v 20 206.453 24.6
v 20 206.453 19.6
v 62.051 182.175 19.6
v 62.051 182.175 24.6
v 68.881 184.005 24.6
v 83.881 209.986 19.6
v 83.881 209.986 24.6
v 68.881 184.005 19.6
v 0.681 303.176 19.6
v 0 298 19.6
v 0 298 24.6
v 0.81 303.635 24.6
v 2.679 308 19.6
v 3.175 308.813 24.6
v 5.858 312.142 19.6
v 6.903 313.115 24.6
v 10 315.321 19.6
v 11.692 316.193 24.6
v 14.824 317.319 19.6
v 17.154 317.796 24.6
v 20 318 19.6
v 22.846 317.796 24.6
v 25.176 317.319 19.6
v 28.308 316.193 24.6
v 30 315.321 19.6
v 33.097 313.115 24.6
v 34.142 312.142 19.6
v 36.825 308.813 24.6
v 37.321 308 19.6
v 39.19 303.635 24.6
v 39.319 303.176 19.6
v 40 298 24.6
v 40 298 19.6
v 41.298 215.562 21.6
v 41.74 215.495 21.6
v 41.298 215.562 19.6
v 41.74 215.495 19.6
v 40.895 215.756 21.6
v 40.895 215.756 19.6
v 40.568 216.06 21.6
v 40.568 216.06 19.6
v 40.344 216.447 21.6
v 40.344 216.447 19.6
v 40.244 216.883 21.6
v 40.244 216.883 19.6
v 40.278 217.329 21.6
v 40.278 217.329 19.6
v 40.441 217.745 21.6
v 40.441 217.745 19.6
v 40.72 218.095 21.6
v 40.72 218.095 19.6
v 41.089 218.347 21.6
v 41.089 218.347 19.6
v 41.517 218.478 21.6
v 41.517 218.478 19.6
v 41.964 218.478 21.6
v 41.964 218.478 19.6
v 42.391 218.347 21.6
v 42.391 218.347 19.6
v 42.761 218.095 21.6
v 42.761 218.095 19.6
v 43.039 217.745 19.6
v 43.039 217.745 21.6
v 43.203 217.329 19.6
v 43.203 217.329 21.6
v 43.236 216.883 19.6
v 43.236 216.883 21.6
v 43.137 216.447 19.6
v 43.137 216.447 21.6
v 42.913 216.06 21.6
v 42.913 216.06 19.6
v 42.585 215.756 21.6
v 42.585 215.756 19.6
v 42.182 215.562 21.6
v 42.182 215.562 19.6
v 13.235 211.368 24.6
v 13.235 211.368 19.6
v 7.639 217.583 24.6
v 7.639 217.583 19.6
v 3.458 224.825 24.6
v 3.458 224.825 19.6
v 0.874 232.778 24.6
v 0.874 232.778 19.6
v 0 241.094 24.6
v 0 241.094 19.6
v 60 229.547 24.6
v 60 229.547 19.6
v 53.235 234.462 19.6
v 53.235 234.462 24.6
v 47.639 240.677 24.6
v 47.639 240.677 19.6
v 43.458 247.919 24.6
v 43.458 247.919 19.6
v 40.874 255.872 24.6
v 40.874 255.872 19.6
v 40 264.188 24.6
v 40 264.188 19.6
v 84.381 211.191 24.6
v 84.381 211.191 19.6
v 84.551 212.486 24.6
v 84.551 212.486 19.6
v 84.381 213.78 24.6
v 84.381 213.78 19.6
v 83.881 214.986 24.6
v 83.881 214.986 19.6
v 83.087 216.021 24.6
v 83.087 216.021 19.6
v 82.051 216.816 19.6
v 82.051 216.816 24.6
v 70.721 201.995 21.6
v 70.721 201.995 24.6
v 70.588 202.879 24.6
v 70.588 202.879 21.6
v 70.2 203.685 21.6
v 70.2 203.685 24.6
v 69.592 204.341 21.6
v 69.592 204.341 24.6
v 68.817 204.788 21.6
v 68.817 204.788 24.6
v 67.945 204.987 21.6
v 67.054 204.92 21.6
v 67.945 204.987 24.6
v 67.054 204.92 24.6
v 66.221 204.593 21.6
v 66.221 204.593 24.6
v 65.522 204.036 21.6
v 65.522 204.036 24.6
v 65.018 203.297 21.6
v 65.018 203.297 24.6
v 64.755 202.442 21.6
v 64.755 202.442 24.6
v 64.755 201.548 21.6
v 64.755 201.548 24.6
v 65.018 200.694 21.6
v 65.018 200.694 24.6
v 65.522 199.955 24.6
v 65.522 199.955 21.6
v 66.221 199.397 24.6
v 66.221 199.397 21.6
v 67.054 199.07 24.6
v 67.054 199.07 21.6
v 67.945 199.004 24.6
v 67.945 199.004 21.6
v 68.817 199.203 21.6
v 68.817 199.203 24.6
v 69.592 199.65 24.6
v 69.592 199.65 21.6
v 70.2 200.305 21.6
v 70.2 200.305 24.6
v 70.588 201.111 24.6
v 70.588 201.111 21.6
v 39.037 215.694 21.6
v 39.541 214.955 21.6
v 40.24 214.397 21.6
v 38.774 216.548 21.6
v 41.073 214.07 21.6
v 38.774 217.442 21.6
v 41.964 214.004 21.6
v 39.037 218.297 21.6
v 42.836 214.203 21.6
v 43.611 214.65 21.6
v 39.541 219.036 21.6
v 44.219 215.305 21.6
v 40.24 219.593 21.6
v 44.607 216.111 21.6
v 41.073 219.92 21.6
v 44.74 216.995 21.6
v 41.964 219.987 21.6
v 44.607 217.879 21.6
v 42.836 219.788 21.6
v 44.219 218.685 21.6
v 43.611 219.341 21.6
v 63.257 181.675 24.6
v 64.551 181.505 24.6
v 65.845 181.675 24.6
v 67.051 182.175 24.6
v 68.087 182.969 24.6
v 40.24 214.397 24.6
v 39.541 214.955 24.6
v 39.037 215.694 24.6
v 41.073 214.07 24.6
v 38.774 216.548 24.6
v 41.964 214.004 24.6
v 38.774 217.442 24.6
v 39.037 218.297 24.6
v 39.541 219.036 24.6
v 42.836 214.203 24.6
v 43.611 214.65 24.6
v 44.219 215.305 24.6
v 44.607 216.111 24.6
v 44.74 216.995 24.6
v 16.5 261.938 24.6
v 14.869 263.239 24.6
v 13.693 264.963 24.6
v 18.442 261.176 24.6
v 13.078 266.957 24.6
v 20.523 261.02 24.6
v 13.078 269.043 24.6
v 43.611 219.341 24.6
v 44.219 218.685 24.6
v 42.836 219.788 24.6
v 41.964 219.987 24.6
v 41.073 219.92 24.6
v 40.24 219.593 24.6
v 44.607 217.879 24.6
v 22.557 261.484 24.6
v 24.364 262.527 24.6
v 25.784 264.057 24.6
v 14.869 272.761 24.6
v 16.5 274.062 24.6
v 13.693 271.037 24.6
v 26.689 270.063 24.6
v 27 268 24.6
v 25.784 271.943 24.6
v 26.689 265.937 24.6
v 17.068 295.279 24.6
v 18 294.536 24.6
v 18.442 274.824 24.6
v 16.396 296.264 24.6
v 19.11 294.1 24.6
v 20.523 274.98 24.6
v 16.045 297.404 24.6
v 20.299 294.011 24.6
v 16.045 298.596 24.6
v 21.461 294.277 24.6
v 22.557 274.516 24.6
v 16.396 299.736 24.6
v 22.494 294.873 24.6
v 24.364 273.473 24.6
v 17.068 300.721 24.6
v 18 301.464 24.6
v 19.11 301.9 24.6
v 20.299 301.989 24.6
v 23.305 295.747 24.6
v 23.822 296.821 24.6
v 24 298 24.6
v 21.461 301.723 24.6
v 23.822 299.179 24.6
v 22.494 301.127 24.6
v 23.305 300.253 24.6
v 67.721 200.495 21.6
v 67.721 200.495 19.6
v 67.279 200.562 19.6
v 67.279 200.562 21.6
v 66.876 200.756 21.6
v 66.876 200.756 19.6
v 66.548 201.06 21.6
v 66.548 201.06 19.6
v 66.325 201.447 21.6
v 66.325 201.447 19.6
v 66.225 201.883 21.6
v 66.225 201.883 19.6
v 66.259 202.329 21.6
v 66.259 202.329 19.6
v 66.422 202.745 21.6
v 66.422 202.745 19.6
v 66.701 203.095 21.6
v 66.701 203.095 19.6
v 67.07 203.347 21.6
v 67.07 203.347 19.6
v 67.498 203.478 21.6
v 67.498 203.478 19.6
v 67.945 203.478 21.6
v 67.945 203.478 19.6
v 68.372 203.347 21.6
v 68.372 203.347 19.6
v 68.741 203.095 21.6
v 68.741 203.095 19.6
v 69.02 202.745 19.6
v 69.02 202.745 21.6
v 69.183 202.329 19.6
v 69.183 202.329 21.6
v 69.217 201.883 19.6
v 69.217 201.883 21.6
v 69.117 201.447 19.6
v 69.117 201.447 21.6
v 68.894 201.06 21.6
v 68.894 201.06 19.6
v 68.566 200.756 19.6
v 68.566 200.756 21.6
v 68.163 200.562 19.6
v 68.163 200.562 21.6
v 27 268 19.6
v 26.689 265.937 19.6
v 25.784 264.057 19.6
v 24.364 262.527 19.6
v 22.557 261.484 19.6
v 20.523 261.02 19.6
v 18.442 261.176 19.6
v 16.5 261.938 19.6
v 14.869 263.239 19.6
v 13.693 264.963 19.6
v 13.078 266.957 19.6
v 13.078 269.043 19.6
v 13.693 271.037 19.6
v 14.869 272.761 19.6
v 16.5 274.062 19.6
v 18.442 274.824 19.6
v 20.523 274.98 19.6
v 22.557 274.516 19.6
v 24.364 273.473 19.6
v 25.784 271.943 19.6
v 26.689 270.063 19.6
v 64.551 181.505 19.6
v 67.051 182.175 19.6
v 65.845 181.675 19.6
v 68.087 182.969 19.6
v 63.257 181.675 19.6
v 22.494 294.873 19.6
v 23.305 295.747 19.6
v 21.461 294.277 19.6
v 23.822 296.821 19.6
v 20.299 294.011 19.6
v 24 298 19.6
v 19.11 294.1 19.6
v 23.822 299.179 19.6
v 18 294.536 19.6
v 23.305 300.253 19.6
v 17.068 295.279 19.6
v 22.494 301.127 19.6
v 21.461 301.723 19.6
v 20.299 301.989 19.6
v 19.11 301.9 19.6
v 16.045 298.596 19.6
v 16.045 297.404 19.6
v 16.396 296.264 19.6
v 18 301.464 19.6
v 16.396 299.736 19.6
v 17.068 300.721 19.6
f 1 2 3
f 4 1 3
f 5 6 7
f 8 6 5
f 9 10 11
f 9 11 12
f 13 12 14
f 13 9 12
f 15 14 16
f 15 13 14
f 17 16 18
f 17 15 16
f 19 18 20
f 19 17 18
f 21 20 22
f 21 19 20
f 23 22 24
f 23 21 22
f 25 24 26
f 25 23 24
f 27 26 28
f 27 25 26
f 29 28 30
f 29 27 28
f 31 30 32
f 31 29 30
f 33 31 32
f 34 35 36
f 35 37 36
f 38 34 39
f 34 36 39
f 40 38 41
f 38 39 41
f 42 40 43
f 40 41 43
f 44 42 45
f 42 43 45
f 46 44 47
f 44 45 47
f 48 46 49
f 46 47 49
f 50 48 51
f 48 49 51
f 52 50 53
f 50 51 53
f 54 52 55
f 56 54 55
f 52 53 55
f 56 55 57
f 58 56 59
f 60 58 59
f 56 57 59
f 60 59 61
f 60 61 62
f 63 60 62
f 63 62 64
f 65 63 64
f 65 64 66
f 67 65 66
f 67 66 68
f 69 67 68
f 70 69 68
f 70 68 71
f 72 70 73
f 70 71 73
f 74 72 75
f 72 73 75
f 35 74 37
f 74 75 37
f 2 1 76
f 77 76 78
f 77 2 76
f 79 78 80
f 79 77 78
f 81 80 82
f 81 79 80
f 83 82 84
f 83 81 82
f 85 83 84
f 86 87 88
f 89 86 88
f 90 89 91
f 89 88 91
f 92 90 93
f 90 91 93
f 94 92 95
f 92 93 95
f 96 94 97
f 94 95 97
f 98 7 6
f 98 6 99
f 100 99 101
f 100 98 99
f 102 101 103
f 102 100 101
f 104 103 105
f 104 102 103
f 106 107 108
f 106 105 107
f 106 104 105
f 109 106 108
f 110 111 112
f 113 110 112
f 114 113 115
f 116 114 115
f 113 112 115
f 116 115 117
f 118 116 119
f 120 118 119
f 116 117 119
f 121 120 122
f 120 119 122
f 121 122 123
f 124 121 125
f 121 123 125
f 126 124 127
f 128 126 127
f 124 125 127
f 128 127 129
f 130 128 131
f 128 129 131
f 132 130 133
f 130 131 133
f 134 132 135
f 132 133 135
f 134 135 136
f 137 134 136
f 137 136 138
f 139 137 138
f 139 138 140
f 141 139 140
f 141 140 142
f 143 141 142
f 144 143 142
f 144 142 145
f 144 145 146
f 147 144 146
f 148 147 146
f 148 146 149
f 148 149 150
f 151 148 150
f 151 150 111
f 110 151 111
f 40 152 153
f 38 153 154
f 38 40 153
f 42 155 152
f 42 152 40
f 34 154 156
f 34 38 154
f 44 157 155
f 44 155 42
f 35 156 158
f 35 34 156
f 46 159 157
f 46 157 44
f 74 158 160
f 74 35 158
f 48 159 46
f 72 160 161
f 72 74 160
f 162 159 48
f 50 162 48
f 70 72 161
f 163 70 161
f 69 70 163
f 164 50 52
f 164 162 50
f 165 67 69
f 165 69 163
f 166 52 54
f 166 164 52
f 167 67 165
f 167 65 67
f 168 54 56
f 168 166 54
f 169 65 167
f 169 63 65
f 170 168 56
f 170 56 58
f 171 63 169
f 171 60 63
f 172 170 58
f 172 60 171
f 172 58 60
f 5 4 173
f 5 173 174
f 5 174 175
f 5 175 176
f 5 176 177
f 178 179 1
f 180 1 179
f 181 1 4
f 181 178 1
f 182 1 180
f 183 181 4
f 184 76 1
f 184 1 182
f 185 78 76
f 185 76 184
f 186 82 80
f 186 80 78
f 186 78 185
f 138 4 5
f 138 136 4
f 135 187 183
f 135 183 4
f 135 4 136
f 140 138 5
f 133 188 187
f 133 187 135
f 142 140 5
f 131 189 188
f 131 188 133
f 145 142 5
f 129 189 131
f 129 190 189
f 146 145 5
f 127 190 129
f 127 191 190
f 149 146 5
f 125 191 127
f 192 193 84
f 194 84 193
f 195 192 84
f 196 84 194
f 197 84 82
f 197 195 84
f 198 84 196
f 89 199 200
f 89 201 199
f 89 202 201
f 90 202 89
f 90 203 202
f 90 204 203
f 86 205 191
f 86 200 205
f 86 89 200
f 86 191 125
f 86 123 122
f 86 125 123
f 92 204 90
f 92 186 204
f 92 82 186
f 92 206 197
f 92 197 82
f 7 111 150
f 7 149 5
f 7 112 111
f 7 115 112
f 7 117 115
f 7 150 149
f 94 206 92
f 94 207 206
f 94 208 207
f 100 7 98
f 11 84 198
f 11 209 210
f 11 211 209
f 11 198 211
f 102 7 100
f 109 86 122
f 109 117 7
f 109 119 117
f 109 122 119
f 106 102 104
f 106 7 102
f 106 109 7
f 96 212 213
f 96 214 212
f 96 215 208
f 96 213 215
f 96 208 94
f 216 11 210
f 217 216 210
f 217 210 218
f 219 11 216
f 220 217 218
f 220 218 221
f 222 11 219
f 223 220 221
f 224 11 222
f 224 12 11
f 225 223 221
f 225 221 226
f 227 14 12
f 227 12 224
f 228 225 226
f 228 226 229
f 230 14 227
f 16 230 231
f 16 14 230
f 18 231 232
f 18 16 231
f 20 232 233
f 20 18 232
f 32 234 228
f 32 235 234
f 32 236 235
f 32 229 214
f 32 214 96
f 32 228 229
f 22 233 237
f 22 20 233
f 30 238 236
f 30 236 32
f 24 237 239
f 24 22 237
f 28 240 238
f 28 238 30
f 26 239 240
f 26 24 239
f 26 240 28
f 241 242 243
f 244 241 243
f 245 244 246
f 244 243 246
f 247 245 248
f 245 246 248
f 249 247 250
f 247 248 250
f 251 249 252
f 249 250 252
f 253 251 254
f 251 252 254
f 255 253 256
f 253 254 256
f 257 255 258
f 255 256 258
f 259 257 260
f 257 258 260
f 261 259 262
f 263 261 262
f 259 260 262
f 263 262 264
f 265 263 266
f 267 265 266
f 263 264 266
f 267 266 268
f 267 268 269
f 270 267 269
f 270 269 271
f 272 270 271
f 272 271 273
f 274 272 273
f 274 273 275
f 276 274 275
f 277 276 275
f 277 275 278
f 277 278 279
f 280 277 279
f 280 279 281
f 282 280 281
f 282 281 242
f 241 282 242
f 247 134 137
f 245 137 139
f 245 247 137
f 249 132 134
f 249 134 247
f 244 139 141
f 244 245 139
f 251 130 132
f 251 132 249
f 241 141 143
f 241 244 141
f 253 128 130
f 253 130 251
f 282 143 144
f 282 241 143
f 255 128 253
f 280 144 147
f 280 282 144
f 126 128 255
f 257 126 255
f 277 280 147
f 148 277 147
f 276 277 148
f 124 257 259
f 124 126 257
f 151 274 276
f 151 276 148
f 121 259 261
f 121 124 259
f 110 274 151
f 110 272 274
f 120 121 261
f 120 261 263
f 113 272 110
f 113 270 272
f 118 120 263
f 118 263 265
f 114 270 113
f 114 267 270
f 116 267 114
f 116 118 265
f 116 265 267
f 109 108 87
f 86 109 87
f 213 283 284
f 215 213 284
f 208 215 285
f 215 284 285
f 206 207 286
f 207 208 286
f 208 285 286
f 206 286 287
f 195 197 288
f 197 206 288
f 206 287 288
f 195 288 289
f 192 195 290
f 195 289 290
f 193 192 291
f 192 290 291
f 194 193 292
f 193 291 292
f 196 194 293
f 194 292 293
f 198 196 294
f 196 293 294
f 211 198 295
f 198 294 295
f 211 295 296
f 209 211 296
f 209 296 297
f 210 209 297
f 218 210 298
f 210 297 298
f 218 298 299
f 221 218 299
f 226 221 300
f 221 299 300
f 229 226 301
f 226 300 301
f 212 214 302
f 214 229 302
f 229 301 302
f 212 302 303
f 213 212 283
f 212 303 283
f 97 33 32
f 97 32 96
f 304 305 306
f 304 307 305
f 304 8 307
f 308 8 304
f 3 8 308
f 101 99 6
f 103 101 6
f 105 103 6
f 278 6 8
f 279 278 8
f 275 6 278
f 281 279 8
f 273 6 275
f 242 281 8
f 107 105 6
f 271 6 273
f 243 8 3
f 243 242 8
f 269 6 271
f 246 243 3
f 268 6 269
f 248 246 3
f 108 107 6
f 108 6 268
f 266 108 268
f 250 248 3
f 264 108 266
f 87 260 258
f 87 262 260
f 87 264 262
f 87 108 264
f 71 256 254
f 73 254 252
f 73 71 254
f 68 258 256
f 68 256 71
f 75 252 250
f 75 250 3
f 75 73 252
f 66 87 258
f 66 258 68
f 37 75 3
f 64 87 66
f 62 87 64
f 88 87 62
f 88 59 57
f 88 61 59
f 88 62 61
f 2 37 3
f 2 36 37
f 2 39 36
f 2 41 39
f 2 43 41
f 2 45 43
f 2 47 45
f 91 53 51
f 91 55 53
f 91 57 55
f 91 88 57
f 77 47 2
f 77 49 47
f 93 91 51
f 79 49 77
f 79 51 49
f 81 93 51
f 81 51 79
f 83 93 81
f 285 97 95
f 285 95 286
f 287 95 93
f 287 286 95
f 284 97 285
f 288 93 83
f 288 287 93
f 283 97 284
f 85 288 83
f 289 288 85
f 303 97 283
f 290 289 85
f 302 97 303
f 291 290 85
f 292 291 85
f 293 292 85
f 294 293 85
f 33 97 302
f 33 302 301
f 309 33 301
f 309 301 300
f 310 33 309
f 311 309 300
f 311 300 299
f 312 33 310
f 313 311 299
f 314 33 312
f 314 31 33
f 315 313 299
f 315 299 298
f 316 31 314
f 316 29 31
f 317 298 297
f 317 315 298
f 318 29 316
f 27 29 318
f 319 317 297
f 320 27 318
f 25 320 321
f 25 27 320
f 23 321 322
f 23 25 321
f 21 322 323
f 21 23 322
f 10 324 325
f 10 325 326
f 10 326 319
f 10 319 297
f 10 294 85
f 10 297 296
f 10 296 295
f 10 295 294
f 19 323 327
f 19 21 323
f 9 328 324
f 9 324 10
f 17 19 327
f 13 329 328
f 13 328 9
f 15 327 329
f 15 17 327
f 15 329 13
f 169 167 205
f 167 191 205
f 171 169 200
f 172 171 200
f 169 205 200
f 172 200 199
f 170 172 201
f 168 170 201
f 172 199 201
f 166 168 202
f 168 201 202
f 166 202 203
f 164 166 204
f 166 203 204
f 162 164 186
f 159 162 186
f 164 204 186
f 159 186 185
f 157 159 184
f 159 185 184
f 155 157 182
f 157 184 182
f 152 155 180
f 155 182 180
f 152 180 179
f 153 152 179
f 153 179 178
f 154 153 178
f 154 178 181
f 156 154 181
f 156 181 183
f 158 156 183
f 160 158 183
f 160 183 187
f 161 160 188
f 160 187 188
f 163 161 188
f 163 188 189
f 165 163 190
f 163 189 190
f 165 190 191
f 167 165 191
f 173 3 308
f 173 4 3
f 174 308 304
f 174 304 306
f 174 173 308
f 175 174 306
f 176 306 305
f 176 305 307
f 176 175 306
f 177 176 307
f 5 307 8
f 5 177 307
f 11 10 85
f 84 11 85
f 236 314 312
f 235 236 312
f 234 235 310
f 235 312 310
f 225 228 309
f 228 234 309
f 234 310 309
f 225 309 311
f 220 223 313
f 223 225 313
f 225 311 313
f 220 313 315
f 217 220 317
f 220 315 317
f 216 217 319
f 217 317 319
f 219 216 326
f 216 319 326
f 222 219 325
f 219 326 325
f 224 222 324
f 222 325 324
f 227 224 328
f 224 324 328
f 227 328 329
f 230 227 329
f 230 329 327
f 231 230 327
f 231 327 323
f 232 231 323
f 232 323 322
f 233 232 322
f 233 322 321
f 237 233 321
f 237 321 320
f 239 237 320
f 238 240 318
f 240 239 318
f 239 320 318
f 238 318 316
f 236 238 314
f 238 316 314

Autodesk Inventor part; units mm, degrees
ref_plane "YZ Plane" through (0, 0, 0) normal (1, 0, 0) x (0, 1, 0)
ref_plane "XZ Plane" through (0, 0, 0) normal (0, 1, 0) x (-1, 0, 0)
ref_plane "XY Plane" through (0, 0, 0) normal (0, 0, 1) x (1, 0, 0)
sketch "スケッチ1" plane through (0, 0, 0) normal (0, 0, 1) x (1, 0, 0)
  line L0 (0, 0) -> (40, 0)
  line L1 (40, 0) -> (40, 318)
  line L2 (40, 318) -> (0, 318)
  line L3 (0, 318) -> (0, 0)
  line L4 (0, 218) -> (112.7627, 152.8964)
  line L5 (112.7627, 152.8964) -> (132.7627, 187.5375)
  line L6 (132.7627, 187.5375) -> (40, 241.094)
  point P0 (40, 218)
  point P1 (40, 194.906)
  point P2 (20, 318)
  point P3 (122.7627, 170.2169)
  point P4 (20, 258)
  dimension "d0" = 40
  dimension "d1" = 318
  dimension "d69" = 40
  dimension "d70" = 60
  dimension "d91" = 20
  dimension "d92" = 100
  dimension "d93" = 180
  dimension "d96" = 20
  dimension "d97" = 60
extrude "押し出し1" add sketch "スケッチ1" along normal blind 19.6 contours L3 L2 L1 L4 | L1 L6 L5 L4
sketch "スケッチ6" plane through (0, 0, 19.6) normal (0, 0, 1) x (1, 0, 0)
  circle A0 centre (20, 268) radius 7
  line L0 (40, 318) -> (0, 318) projected
  line L1 (40, 241.094) -> (40, 318) projected
  circle A1 centre (20, 20) radius 1.2295
  circle A2 centre (20, 10) radius 1.2295
  line L2 (0, 0) -> (40, 0) projected
  circle A3 centre (20, 298) radius 4
  point P0 (20, 318)
  point P1 (40, 190.8114)
  point P2 (30, 0)
  dimension "d42" = 14
  dimension "d44" = 20
  dimension "d45" = 2.459
  dimension "d46" = 2.459
  dimension "d47" = 10
  dimension "d48" = 10
  dimension "d49" = 20
  dimension "d50" = 20
  dimension "d53" = 8
  dimension "d54" = 20
  dimension "d55" = 30
  dimension "d56" = 20
extrude "押し出し4" cut sketch "スケッチ6" against normal through all contours A0 | A3
sketch "スケッチ8" plane through (0, 0, 0) normal (-1, 0, 0) x (0, 0, 1)
  line L0 (0, 318) -> (19.6, 318) projected
  line L1 (5, 318) -> (14.6, 318)
  line L2 (14.6, 318) -> (14.6, 278)
  line L3 (14.6, 278) -> (5, 278)
  line L4 (5, 278) -> (5, 318)
  line L5 (0, 318) -> (0, 0) projected
  dimension "d57" = 5
  dimension "d58" = 9.6
  dimension "d59" = 40
  dimension "d98" = 19.6
extrude "押し出し5" cut sketch "スケッチ8" against normal through all
fillet "フィレット1" radius 20 4 edges at (40, 318, 17.1) (40, 318, 2.5) (0, 318, 2.5) (0, 318, 17.1)
fillet "フィレット2" radius 40 2 edges at (0, 218, 9.8) (40, 241.094, 9.8)
sketch "スケッチ9" plane through (0, 0, 19.6) normal (0, 0, 1) x (1, 0, 0)
  line L0 (20, 206.453) -> (112.7627, 152.8964) projected
  line L1 (132.7627, 187.5375) -> (60, 229.547) projected
  line L2 (112.7627, 152.8964) -> (132.7627, 187.5375) projected
  line L3 (132.7627, 187.5375) -> (112.7627, 152.8964)
  line L4 (66.3813, 179.6747) -> (112.7627, 152.8964)
  line L5 (132.7627, 187.5375) -> (166.773, 167.9016)
  line L6 (115.1204, 126.9801) -> (133.5174, 158.8446)
  line L7 (141.7531, 173.1092) -> (128.7627, 180.6092)
  line L8 (112.7627, 152.8964) -> (20, 206.453)
  line L9 (132.7627, 187.5375) -> (60, 229.547)
  line L10 (115.1204, 126.9801) -> (125.7531, 145.3964)
  line L11 (133.5174, 158.8446) -> (145.7531, 180.0375)
  line L12 (116.7627, 159.8246) -> (129.7531, 152.3246)
  line L13 (66.3813, 179.6747) -> (129.7531, 152.3246)
  line L14 (66.3813, 179.6747) -> (86.3813, 214.3157)
  line L15 (86.3813, 214.3157) -> (141.7531, 173.1092)
  point P0 (0, 0)
  point P1 (254.4532, 80.329)
  point P2 (128.7627, 180.6092)
  point P3 (123.2579, 156.0746)
  point P4 (86.3813, 214.3157)
  point P5 (40, 194.906)
  point P6 (115.8875, 158.3088)
  point P7 (129.6379, 182.1251)
  dimension "d80" = 24
  dimension "d81" = 40
  dimension "d83" = 15
  dimension "d84" = 8
  dimension "d90" = 24
extrude "押し出し6" cut sketch "スケッチ9" against normal through all contours L13 L2 L0 | L1 L2 L15
sketch "スケッチ11" plane through (104.9897, 139.4332, 24) normal (0.8660254, -0.5, 0) x (0, 0, -1)
  line L0 (4.4, 21.7957) -> (4.4, 49.2964) projected
  line L1 (24, 21.7957) -> (24, 49.2964) projected
  line L2 (0, 24) -> (24, 24)
  line L3 (24, 24) -> (24, 0)
  line L4 (24, 0) -> (0, 0)
  line L5 (0, 0) -> (0, 24)
  line L6 (17, 17) -> (7, 17)
  line L7 (7, 17) -> (7, 7)
  line L8 (7, 7) -> (17, 7)
  line L9 (17, 7) -> (17, 17)
  line L10 (4.4, 35.546) -> (24, 35.546) projected
  circle A0 centre (14.2, 35.546) radius 5
  point P0 (24, -173.2475)
  point P1 (24, 24)
  point P2 (0, 15.546)
  point P3 (24, 15.546)
  dimension "d85" = 10
  dimension "d88" = 10
extrude "押し出し7" add sketch "スケッチ11" along normal blind 15 contours A0 L10 | L10 A0
fillet "フィレット4" radius 20 2 edges at (0, 278, 9.8) (40, 278, 9.8)
sketch "スケッチ12" plane through (0, 0, 19.6) normal (0, 0, 1) x (1, 0, 0)
  line L0 (0, 340.2847) -> (40, 340.2847)
  line L1 (40, 340.2847) -> (40, 181.2581)
  line L2 (40, 181.2581) -> (0, 181.2581)
  line L3 (0, 181.2581) -> (0, 340.2847)
  line L4 (40, 264.188) -> (40, 298) projected
  arc A0 (40, 298) -> (0, 298) centre (20, 298) ccw
  arc A1 (40, 264.188) -> (60, 229.547) centre (80, 264.188) ccw projected
  line L5 (60, 229.547) -> (40, 194.906)
  line L6 (20, 206.453) -> (66.3813, 179.6747) projected
  arc A2 (0, 241.094) -> (20, 206.453) centre (40, 241.094) ccw projected
  arc A3 (0, 241.094) -> (20, 206.453) centre (40, 241.094) ccw
  line L7 (20, 206.453) -> (40, 194.906)
  line L8 (86.3813, 214.3157) -> (60, 229.547) projected
  line L9 (60, 229.547) -> (86.3813, 214.3157)
  line L10 (86.3813, 214.3157) -> (66.3813, 179.6747)
  line L11 (40, 194.906) -> (66.3813, 179.6747)
  circle A4 centre (20, 298) radius 4
  circle A5 centre (20, 268) radius 7 projected
  circle A6 centre (20, 268) radius 4
  point P0 (0, 0)
  dimension "d99" = 40
  dimension "d100" = 40
extrude "押し出し8" add sketch "スケッチ12" along normal blind 5 contours A0 L1 L6 A2 L3 | A1 L5 L1 | L5 L8 L10 L6
sketch "スケッチ13" plane through (0, 0, 0) normal (0, 0, -1) x (-1, 0, 0)
  line L0 (-253.843, 397.4333) -> (123.9074, 397.4333)
  line L1 (123.9074, 397.4333) -> (123.9074, 95.9261)
  line L2 (123.9074, 95.9261) -> (-253.843, 95.9261)
  line L3 (-253.843, 95.9261) -> (-253.843, 397.4333)
  point P0 (0, 0)
extrude "押し出し9" cut sketch "スケッチ13" against normal blind 19.6
sketch "スケッチ14" plane through (0, 0, 24.6) normal (0, 0, 1) x (1, 0, 0)
  line L0 (20, 206.453) -> (66.3813, 179.6747) projected
  line L1 (66.3813, 179.6747) -> (86.3813, 214.3157) projected
  line L2 (41.7403, 216.9952) -> (76.3813, 196.9952)
  point P0 (0, 0)
  point P1 (67.7211, 201.9952)
  dimension "d105" = 20
  dimension "d106" = 20
  dimension "d107" = 30
  dimension "d108" = 10
hole "穴3" at (41.7403, 216.9952, 24.6) at (67.7211, 201.9952, 24.6) direction (0, 0, -1) diameter 3 end through all
fillet "フィレット5" radius 5 2 edges at (86.3813, 214.3157, 22.1) (66.3813, 179.6747, 22.1)
sketch "スケッチ15" plane through (0, 0, 24.6) normal (0, 0, 1) x (1, 0, 0)
  circle A0 centre (41.7403, 216.9952) radius 1.5 projected
  circle A1 centre (41.7403, 216.9952) radius 3
  circle A2 centre (67.7211, 201.9952) radius 1.5 projected
  circle A3 centre (67.7211, 201.9952) radius 3
  point P0 (0, 0)
  dimension "d117" = 6
  dimension "d118" = 6
extrude "押し出し10" cut sketch "スケッチ15" against normal blind 3
equation "\"d45\" = d46"
equation "\"d48\" = d47"
equation "\"d50\" = d49"
equation "\"d106\" = d105"
properties part number "BR_parts_06(1)" material "アルミニウム 6061"
